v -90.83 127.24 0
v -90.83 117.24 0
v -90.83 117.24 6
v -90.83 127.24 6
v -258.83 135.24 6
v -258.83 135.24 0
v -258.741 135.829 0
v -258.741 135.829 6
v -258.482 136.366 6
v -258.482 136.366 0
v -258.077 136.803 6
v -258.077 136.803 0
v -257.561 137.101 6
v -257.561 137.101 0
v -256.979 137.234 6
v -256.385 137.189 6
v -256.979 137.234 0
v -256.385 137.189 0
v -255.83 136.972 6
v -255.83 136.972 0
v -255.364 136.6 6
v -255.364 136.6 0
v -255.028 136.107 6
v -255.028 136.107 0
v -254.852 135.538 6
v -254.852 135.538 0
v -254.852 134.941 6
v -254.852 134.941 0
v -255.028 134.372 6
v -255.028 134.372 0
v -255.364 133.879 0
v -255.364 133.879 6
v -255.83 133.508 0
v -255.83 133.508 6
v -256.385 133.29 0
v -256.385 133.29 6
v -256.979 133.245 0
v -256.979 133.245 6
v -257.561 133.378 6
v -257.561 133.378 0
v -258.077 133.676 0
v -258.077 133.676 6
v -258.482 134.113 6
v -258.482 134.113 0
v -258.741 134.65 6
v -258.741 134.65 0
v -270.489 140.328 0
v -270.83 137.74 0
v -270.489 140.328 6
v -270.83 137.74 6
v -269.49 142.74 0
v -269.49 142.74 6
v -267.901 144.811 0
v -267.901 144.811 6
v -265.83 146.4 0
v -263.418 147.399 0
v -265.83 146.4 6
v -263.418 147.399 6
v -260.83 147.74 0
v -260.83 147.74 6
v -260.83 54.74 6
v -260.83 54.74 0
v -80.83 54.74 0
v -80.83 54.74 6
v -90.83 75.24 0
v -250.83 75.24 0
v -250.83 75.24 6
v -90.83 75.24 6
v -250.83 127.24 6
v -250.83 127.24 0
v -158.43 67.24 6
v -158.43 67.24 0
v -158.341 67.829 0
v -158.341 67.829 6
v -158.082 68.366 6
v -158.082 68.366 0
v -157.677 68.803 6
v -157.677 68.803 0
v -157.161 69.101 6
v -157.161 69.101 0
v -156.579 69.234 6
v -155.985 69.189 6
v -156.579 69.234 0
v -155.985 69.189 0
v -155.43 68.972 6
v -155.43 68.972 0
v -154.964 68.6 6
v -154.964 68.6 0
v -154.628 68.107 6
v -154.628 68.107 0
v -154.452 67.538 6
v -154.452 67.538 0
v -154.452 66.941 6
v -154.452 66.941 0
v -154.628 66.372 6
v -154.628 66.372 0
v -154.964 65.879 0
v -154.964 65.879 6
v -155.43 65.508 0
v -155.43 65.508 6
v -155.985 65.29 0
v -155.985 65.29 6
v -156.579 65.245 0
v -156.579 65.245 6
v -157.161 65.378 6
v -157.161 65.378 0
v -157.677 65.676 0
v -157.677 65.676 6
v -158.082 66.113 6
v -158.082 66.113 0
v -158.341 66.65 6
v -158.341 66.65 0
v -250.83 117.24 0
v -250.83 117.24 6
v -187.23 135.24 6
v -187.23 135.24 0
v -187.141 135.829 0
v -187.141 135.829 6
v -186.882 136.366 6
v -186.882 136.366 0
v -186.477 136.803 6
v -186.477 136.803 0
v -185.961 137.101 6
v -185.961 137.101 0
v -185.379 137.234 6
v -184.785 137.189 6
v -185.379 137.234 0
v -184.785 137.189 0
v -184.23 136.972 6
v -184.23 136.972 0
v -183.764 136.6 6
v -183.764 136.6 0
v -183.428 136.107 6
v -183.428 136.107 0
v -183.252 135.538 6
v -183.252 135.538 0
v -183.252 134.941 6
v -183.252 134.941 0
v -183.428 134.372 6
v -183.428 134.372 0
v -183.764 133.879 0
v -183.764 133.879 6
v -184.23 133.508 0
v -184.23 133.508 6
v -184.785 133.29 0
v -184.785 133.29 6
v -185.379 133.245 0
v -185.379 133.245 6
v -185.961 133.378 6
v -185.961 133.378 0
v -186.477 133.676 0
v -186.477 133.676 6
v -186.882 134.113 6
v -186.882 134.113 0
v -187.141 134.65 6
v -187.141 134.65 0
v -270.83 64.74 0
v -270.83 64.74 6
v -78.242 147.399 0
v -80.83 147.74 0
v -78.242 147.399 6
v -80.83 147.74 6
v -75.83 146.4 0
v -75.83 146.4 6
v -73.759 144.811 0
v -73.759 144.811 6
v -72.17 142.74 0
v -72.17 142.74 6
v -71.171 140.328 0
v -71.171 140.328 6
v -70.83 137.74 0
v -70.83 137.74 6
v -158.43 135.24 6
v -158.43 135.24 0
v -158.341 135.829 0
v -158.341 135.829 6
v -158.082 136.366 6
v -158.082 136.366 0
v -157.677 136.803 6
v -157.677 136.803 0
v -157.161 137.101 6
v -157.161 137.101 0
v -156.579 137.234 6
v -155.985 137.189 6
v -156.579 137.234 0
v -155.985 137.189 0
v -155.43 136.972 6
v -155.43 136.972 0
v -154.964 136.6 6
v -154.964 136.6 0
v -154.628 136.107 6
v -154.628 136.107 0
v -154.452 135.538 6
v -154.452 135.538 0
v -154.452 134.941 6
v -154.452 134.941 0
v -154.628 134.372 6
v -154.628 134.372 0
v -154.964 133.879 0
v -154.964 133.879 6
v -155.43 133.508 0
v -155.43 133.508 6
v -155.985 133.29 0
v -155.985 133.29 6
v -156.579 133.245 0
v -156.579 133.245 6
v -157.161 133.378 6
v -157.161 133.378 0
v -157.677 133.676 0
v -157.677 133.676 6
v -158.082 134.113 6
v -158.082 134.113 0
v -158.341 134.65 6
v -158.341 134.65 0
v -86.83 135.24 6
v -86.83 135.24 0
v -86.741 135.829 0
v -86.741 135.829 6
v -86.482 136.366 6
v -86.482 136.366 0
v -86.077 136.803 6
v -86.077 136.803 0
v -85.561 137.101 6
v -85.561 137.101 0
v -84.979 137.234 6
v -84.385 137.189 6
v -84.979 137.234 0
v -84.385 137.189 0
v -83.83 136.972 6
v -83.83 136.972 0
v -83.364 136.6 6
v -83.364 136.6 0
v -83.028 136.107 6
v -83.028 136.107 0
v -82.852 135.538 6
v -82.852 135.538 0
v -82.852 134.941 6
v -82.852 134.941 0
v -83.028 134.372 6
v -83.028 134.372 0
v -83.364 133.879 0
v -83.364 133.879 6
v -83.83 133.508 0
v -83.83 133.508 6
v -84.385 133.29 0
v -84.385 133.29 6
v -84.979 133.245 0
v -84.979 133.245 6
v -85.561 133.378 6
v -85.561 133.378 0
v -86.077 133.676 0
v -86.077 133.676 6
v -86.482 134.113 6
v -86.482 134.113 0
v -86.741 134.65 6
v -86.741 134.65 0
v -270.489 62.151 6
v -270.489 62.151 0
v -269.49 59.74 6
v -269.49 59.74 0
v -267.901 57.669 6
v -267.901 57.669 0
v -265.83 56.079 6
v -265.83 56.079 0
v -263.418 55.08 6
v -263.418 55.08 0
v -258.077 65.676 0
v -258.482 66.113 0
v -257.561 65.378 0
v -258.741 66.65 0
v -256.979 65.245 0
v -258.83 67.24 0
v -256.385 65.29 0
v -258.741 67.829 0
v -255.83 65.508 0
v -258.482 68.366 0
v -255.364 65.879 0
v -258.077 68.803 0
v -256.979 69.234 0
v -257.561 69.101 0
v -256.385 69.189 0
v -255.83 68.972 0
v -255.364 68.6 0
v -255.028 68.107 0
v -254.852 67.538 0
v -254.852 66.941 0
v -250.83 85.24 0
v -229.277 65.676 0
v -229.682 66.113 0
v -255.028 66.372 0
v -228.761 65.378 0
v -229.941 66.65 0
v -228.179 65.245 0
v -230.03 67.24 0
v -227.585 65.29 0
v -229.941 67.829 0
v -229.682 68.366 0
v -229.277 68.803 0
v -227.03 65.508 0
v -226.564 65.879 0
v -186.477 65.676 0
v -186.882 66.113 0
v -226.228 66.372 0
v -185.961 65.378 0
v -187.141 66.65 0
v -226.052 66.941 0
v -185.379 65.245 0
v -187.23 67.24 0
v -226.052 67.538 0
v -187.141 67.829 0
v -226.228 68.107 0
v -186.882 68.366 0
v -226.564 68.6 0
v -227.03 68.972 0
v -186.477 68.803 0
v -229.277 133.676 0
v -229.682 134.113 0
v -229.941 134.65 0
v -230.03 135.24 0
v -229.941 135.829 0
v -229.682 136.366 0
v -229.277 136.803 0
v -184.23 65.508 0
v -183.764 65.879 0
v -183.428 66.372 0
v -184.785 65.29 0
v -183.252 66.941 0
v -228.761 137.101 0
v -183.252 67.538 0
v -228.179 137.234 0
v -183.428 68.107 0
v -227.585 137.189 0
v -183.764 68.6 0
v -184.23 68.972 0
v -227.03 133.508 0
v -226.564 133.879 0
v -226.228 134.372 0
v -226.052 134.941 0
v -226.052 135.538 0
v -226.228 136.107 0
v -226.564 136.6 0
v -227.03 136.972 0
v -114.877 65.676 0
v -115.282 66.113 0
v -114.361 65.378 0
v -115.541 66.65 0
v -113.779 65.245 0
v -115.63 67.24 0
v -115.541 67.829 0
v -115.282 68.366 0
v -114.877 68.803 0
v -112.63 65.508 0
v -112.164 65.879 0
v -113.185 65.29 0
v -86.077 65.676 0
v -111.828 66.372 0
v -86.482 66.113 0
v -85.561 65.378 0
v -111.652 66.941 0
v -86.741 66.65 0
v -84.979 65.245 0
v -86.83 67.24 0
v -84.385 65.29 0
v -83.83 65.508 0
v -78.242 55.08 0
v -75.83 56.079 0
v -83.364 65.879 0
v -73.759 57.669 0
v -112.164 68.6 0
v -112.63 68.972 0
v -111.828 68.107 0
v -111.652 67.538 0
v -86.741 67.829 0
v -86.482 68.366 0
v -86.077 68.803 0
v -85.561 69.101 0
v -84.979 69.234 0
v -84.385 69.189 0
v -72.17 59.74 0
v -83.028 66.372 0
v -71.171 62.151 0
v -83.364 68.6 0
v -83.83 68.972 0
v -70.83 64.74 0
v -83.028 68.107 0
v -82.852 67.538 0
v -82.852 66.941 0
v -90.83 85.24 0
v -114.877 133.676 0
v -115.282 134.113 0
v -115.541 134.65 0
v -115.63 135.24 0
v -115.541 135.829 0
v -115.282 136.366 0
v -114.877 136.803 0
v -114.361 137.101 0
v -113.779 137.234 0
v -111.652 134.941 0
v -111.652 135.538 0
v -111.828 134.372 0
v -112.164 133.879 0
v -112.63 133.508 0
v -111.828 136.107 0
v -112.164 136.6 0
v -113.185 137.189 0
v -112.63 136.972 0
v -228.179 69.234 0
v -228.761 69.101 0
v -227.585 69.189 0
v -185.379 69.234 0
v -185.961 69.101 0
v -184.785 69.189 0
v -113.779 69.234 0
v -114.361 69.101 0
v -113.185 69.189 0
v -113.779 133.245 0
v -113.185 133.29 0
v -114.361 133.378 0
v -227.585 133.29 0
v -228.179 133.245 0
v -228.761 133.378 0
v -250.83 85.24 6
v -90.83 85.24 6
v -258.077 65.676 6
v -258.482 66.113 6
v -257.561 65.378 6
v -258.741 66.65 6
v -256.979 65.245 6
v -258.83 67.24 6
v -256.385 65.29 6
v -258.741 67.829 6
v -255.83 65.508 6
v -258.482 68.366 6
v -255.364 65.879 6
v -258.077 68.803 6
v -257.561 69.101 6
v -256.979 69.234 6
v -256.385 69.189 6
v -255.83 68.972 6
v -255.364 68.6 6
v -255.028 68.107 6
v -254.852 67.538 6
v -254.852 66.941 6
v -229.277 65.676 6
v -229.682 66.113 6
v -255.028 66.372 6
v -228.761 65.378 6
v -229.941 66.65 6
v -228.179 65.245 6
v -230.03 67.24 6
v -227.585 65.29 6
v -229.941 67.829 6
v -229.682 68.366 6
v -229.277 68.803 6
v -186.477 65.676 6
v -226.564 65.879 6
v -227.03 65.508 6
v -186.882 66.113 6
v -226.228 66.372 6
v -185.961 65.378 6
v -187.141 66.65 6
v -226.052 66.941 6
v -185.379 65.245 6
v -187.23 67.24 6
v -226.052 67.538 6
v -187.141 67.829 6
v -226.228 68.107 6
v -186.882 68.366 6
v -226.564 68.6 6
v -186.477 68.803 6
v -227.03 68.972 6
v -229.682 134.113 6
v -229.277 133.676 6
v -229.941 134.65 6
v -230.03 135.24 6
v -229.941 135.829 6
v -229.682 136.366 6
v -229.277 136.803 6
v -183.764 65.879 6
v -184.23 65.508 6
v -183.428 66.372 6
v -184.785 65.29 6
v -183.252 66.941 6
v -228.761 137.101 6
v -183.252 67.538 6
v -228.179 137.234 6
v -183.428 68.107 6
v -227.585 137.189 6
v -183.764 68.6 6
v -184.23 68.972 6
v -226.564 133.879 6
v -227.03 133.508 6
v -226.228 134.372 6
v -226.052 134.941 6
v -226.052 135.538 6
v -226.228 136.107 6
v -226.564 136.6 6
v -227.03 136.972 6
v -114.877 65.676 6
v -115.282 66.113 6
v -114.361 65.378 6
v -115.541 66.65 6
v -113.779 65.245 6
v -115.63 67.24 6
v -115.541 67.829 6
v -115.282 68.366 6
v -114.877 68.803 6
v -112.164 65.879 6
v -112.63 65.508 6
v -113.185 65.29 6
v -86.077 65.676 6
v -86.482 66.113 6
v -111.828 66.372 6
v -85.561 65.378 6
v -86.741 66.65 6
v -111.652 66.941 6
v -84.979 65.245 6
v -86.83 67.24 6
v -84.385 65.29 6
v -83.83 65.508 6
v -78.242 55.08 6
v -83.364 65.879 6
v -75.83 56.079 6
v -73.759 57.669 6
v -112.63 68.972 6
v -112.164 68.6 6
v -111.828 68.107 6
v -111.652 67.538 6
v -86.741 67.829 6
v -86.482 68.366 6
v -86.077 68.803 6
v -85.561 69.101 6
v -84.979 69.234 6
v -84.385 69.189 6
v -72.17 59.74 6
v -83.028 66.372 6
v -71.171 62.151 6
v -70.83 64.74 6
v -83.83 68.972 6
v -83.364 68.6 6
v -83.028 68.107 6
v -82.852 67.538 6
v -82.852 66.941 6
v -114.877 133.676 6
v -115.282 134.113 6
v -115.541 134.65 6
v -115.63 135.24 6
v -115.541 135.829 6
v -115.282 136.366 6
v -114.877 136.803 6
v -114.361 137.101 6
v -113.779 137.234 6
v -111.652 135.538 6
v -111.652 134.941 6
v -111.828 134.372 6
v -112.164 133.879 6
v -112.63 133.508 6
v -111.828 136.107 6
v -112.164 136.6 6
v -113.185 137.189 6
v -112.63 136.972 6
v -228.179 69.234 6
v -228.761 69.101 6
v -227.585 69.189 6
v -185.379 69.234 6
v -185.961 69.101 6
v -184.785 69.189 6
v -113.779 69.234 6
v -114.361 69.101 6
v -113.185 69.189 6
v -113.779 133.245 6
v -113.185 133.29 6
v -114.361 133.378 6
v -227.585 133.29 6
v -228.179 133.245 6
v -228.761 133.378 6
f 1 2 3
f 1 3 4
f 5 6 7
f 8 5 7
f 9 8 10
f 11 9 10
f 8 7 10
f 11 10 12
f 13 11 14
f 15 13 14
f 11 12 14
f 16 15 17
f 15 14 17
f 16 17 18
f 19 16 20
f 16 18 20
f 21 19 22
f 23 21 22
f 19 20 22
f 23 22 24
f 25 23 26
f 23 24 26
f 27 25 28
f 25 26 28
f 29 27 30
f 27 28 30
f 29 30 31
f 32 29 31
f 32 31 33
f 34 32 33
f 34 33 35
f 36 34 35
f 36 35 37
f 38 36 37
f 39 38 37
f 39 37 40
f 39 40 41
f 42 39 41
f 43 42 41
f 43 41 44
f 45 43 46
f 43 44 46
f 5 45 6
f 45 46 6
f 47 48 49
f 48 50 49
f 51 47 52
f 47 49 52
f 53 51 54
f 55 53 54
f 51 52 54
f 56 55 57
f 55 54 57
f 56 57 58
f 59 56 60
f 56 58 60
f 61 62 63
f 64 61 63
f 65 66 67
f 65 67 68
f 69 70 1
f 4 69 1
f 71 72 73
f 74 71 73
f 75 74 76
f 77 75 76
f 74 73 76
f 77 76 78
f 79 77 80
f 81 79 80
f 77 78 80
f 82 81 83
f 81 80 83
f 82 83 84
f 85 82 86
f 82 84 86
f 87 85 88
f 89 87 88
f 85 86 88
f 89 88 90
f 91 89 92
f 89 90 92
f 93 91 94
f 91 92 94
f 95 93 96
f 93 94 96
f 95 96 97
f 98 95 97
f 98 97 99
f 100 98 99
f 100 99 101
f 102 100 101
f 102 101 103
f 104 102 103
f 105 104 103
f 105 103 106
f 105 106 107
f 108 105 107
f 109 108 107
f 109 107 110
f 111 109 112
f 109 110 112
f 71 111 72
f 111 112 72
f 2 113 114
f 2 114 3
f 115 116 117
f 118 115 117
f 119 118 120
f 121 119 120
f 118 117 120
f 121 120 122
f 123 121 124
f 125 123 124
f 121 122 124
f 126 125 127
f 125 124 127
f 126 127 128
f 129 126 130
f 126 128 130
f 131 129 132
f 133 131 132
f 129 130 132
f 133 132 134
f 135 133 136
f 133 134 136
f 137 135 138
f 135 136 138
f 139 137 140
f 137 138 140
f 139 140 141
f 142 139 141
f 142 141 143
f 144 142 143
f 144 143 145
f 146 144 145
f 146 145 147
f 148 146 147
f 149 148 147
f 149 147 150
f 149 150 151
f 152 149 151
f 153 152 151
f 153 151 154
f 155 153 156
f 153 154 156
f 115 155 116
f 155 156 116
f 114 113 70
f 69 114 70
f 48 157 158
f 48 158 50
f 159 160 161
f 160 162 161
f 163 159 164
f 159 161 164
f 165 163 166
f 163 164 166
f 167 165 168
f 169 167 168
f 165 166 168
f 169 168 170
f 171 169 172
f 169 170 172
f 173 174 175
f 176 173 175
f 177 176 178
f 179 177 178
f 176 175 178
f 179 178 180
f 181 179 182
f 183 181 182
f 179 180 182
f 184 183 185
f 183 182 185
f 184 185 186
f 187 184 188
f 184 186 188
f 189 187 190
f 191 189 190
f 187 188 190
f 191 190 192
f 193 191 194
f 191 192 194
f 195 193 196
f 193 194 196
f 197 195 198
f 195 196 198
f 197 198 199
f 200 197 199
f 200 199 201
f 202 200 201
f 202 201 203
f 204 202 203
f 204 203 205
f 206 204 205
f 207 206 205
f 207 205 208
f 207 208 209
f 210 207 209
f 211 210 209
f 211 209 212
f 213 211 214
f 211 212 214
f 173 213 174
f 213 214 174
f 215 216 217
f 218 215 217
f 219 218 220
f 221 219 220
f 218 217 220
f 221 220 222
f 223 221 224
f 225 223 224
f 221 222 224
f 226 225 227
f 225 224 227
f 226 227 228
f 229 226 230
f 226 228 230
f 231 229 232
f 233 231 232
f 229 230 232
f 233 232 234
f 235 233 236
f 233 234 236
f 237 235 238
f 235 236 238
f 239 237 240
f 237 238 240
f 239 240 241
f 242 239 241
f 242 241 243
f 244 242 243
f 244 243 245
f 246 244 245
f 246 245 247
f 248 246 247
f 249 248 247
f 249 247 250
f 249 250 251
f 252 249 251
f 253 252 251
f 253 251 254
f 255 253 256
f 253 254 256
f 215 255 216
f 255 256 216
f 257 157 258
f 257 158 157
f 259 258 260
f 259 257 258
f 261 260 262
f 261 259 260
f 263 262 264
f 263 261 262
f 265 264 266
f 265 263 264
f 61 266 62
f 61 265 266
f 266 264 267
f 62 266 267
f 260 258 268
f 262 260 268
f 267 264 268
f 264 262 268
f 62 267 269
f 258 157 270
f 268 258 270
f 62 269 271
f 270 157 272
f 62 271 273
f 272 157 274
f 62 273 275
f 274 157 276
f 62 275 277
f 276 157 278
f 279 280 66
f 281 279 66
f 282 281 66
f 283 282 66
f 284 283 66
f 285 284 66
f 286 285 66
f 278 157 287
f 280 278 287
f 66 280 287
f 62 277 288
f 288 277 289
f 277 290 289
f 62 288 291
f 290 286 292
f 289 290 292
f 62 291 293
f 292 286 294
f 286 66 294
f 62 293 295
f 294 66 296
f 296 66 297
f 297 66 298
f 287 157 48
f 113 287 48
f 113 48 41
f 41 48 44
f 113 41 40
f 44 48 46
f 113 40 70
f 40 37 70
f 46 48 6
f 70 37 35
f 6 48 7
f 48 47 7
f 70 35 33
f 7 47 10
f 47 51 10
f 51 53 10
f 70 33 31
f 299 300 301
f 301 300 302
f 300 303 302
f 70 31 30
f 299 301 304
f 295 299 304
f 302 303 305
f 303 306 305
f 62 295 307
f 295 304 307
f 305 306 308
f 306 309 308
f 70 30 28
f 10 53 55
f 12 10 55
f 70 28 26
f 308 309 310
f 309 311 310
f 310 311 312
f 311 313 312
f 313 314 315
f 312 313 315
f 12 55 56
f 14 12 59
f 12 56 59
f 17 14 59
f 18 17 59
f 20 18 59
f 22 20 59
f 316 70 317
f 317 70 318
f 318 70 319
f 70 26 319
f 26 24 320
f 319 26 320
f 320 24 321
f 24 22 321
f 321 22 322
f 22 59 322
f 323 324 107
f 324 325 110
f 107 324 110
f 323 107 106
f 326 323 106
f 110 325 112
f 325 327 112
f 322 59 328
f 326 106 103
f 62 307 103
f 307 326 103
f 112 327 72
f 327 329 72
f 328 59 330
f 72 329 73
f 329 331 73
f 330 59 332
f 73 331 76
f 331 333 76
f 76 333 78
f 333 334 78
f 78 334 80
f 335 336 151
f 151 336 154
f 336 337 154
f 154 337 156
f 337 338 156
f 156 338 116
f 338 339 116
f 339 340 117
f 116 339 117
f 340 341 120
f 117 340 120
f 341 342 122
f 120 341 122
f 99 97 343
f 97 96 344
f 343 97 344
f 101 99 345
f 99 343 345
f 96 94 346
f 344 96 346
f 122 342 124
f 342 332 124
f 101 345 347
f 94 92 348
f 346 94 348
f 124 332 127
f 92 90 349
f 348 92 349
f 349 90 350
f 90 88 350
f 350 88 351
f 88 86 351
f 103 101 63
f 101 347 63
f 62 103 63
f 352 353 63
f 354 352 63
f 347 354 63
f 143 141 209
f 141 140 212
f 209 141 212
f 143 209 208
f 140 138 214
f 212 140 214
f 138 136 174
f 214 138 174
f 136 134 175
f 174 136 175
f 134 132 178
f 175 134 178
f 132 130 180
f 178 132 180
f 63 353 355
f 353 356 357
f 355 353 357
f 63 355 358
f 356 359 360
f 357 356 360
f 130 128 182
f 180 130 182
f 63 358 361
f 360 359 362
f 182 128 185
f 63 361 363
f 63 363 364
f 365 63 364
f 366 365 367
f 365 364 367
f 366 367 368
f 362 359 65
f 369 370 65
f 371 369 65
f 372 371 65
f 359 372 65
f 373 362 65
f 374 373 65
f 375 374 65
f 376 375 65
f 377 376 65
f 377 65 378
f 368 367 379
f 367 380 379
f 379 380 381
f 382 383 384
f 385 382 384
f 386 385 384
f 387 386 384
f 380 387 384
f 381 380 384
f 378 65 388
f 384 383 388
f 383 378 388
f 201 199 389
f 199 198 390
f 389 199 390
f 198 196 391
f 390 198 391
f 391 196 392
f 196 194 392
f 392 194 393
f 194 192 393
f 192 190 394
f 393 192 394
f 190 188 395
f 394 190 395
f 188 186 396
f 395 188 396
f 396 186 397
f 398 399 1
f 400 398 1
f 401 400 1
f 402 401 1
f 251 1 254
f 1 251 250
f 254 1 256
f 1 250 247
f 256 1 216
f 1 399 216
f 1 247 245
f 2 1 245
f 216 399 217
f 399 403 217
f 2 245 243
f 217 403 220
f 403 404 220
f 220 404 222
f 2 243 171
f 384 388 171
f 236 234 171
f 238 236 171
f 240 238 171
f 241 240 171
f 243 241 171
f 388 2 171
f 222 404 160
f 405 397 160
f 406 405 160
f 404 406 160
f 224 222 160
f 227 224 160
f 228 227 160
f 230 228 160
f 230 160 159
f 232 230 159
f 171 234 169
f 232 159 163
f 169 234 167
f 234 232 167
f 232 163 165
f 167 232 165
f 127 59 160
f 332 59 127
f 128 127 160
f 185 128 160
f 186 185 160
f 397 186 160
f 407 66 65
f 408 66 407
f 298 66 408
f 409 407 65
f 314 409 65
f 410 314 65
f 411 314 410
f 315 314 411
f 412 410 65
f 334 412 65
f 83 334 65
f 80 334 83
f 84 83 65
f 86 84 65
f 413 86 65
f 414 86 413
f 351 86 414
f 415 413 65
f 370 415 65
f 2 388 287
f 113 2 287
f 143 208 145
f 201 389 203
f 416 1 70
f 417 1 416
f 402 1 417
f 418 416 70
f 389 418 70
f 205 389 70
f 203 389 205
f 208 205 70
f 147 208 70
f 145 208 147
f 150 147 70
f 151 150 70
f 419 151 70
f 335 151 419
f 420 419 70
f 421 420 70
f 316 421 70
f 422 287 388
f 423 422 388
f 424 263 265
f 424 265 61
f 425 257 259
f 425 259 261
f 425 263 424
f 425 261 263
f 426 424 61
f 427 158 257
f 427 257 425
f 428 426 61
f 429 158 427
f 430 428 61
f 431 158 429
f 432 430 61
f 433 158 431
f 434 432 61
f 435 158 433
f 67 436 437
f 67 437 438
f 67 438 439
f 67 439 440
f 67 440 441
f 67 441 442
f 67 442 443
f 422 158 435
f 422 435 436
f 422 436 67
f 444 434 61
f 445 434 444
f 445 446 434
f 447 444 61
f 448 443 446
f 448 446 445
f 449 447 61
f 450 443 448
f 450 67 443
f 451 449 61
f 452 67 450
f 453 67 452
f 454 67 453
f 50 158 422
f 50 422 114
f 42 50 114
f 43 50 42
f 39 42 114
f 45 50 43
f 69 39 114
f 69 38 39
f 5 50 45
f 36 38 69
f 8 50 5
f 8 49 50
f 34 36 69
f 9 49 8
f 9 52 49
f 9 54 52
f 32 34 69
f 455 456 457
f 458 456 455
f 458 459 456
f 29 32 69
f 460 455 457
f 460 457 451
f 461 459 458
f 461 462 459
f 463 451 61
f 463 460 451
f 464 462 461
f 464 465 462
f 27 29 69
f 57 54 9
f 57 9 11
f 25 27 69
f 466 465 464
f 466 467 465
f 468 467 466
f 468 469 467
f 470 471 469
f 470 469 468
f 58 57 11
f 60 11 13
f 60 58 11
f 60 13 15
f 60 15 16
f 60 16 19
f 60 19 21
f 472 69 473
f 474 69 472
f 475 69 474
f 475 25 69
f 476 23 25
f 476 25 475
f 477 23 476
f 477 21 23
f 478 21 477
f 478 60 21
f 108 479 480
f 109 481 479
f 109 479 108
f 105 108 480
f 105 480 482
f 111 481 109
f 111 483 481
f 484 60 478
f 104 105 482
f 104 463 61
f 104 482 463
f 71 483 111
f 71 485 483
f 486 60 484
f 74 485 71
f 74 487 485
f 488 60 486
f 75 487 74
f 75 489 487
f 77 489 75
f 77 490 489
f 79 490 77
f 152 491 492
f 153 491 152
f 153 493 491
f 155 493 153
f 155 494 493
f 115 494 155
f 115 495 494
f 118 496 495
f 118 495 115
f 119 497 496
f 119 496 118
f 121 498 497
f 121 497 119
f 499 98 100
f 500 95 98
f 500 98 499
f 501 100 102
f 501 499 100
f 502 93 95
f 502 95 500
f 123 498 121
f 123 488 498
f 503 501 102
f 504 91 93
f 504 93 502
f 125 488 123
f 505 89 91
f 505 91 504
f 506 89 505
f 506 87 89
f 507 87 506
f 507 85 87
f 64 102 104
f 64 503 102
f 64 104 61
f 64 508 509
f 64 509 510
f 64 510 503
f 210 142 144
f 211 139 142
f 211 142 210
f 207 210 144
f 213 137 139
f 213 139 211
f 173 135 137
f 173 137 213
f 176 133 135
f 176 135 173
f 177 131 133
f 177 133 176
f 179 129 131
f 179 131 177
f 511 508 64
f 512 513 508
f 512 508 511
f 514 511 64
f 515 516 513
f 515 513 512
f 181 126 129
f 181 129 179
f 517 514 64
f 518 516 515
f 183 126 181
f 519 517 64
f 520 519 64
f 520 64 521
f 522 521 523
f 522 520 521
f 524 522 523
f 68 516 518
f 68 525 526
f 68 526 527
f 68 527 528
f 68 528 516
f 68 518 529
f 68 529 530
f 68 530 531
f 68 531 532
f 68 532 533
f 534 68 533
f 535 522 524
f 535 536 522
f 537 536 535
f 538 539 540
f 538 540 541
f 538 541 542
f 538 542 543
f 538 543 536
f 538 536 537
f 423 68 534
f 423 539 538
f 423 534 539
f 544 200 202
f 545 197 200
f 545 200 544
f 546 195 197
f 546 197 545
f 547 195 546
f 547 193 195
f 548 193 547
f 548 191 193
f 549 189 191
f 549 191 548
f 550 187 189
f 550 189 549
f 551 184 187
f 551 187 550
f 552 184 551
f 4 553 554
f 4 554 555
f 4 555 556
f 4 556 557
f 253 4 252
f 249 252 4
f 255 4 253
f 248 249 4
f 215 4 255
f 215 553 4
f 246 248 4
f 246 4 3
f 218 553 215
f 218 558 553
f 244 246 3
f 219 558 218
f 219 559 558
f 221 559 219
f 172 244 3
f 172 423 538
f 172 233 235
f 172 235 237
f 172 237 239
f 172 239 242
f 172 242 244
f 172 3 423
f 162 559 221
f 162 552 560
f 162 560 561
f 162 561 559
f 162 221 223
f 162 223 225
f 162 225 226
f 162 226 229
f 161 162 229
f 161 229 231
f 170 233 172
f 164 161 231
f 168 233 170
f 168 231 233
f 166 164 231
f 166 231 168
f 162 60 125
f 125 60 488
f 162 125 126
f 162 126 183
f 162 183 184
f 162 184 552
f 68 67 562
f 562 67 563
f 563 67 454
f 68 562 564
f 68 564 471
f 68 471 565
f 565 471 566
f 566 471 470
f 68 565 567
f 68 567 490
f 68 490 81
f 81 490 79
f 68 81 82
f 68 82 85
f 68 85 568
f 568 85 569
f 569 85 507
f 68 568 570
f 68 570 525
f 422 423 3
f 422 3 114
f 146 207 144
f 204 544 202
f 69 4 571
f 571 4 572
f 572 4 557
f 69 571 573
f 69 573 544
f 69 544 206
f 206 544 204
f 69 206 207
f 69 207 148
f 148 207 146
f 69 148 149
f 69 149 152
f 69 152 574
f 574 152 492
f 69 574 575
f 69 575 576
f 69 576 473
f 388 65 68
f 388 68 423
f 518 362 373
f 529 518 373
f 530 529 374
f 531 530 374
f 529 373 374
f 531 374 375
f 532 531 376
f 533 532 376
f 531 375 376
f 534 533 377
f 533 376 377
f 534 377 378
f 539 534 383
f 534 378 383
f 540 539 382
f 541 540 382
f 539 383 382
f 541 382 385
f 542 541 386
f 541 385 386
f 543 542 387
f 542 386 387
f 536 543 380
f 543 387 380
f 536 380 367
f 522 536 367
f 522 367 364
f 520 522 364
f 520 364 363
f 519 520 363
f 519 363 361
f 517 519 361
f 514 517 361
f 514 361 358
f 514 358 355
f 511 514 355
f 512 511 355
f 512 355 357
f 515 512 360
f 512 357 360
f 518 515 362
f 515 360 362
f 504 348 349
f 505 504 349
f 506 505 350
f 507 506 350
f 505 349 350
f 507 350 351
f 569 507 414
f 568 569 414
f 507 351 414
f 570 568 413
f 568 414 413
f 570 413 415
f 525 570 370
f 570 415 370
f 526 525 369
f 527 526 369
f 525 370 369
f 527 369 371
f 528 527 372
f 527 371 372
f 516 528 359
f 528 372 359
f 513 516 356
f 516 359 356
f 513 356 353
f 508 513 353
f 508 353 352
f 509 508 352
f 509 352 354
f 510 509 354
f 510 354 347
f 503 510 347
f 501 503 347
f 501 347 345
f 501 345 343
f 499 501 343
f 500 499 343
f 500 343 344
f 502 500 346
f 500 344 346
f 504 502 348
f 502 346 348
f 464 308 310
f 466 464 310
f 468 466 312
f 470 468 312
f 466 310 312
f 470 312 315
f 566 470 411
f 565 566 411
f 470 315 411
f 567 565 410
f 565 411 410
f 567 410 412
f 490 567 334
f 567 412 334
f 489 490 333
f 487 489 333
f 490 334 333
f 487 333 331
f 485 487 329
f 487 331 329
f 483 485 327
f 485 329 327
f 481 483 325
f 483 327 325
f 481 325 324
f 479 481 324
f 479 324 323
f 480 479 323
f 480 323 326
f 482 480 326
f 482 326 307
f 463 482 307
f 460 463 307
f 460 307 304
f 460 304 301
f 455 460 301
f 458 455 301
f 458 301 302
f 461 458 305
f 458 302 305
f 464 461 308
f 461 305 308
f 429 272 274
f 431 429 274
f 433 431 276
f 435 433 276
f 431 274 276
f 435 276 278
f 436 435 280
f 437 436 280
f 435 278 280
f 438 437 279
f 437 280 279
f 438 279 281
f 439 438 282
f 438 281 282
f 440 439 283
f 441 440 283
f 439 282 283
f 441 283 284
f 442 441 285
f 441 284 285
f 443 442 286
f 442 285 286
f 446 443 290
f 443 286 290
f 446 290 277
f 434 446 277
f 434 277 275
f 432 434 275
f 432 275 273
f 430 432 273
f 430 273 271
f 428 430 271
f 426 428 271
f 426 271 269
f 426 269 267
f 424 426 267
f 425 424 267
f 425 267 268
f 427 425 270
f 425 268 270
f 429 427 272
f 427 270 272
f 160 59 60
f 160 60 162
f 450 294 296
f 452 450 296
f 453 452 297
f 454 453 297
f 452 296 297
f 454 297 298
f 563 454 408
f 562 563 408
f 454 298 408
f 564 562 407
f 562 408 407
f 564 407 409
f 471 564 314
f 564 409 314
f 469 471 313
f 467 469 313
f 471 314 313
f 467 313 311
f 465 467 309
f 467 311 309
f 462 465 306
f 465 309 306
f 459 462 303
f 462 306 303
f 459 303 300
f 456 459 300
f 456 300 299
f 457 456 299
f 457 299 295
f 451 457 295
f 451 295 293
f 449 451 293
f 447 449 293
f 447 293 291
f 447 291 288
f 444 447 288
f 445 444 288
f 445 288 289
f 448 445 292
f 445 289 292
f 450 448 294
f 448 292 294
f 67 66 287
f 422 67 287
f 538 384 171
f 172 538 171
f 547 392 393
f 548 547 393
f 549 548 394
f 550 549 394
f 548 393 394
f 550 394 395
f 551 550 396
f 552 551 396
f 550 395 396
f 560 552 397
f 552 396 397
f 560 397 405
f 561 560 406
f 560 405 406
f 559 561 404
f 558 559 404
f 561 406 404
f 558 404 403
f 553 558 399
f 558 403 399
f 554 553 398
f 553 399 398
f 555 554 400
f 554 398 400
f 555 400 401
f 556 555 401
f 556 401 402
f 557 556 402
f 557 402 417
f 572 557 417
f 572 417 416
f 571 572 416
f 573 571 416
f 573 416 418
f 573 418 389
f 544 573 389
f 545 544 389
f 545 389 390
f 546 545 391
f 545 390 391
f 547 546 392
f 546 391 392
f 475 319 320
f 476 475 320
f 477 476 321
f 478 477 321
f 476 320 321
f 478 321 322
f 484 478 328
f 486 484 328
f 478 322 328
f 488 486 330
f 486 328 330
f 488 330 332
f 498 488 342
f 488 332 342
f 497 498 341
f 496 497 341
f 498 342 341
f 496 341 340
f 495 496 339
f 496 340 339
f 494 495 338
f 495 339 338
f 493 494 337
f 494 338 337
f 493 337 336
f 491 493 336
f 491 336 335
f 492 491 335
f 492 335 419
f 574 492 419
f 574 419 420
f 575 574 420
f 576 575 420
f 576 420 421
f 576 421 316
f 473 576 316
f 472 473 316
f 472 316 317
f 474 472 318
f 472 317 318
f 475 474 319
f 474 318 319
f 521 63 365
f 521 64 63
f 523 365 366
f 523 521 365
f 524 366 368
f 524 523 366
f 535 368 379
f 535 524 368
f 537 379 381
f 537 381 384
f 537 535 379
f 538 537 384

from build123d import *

# Parameters (mm, degrees)
SKETCH_1_W          = 200
SKETCH_1_H          = 93
SKETCH_1_W_2        = 160
SKETCH_1_H_2        = 10
EXTRUDE_1_DEPTH     = 6
SKETCH_2_R          = 2
CUT_EXTRUDE_1_DEPTH = 6
FILLET_1_R          = 10


with BuildPart() as part:
    # 草圖1 → 填料-伸長1 (new body)
    with BuildSketch(Plane.XY):
        with Locations((-170.830010195, 101.23957139)):
            Rectangle(SKETCH_1_W, SKETCH_1_H)
        with Locations((-170.830010195, 122.23957139)):
            Rectangle(SKETCH_1_W_2, SKETCH_1_H_2, mode=Mode.SUBTRACT)
        with Locations((-170.830010195, 80.23957139)):
            Rectangle(SKETCH_1_W_2, SKETCH_1_H_2, mode=Mode.SUBTRACT)
    extrude(amount=EXTRUDE_1_DEPTH)

    # 草圖2 → 除料-伸長1 (cut)
    with BuildSketch(Plane(origin=(0, 0, 0), x_dir=(-1, 0, 0), z_dir=(0, 0, -1))):
        with Locations((84.830010195, 135.23957139)):
            Circle(SKETCH_2_R)
        with Locations((113.630010195, 135.23957139)):
            Circle(SKETCH_2_R)
        with Locations((156.430010195, 135.23957139)):
            Circle(SKETCH_2_R)
        with Locations((185.230010195, 135.23957139)):
            Circle(SKETCH_2_R)
        with Locations((228.030010195, 135.23957139)):
            Circle(SKETCH_2_R)
        with Locations((256.830010195, 135.23957139)):
            Circle(SKETCH_2_R)
        with Locations((84.830010195, 67.23957139)):
            Circle(SKETCH_2_R)
        with Locations((113.630010195, 67.23957139)):
            Circle(SKETCH_2_R)
        with Locations((156.430010195, 67.23957139)):
            Circle(SKETCH_2_R)
        with Locations((185.230010195, 67.23957139)):
            Circle(SKETCH_2_R)
        with Locations((228.030010195, 67.23957139)):
            Circle(SKETCH_2_R)
        with Locations((256.830010195, 67.23957139)):
            Circle(SKETCH_2_R)
    extrude(amount=-CUT_EXTRUDE_1_DEPTH, mode=Mode.SUBTRACT)

    # 圓角1
    fillet_1_edges = [part.edges().sort_by_distance(p)[0] for p in [
        (-70.830010195, 54.73957139, 3),
        (-270.830010195, 54.73957139, 3),
        (-270.830010195, 147.73957139, 3),
        (-70.830010195, 147.73957139, 3),
    ]]
    fillet(fillet_1_edges, radius=FILLET_1_R)


solid = part.part
